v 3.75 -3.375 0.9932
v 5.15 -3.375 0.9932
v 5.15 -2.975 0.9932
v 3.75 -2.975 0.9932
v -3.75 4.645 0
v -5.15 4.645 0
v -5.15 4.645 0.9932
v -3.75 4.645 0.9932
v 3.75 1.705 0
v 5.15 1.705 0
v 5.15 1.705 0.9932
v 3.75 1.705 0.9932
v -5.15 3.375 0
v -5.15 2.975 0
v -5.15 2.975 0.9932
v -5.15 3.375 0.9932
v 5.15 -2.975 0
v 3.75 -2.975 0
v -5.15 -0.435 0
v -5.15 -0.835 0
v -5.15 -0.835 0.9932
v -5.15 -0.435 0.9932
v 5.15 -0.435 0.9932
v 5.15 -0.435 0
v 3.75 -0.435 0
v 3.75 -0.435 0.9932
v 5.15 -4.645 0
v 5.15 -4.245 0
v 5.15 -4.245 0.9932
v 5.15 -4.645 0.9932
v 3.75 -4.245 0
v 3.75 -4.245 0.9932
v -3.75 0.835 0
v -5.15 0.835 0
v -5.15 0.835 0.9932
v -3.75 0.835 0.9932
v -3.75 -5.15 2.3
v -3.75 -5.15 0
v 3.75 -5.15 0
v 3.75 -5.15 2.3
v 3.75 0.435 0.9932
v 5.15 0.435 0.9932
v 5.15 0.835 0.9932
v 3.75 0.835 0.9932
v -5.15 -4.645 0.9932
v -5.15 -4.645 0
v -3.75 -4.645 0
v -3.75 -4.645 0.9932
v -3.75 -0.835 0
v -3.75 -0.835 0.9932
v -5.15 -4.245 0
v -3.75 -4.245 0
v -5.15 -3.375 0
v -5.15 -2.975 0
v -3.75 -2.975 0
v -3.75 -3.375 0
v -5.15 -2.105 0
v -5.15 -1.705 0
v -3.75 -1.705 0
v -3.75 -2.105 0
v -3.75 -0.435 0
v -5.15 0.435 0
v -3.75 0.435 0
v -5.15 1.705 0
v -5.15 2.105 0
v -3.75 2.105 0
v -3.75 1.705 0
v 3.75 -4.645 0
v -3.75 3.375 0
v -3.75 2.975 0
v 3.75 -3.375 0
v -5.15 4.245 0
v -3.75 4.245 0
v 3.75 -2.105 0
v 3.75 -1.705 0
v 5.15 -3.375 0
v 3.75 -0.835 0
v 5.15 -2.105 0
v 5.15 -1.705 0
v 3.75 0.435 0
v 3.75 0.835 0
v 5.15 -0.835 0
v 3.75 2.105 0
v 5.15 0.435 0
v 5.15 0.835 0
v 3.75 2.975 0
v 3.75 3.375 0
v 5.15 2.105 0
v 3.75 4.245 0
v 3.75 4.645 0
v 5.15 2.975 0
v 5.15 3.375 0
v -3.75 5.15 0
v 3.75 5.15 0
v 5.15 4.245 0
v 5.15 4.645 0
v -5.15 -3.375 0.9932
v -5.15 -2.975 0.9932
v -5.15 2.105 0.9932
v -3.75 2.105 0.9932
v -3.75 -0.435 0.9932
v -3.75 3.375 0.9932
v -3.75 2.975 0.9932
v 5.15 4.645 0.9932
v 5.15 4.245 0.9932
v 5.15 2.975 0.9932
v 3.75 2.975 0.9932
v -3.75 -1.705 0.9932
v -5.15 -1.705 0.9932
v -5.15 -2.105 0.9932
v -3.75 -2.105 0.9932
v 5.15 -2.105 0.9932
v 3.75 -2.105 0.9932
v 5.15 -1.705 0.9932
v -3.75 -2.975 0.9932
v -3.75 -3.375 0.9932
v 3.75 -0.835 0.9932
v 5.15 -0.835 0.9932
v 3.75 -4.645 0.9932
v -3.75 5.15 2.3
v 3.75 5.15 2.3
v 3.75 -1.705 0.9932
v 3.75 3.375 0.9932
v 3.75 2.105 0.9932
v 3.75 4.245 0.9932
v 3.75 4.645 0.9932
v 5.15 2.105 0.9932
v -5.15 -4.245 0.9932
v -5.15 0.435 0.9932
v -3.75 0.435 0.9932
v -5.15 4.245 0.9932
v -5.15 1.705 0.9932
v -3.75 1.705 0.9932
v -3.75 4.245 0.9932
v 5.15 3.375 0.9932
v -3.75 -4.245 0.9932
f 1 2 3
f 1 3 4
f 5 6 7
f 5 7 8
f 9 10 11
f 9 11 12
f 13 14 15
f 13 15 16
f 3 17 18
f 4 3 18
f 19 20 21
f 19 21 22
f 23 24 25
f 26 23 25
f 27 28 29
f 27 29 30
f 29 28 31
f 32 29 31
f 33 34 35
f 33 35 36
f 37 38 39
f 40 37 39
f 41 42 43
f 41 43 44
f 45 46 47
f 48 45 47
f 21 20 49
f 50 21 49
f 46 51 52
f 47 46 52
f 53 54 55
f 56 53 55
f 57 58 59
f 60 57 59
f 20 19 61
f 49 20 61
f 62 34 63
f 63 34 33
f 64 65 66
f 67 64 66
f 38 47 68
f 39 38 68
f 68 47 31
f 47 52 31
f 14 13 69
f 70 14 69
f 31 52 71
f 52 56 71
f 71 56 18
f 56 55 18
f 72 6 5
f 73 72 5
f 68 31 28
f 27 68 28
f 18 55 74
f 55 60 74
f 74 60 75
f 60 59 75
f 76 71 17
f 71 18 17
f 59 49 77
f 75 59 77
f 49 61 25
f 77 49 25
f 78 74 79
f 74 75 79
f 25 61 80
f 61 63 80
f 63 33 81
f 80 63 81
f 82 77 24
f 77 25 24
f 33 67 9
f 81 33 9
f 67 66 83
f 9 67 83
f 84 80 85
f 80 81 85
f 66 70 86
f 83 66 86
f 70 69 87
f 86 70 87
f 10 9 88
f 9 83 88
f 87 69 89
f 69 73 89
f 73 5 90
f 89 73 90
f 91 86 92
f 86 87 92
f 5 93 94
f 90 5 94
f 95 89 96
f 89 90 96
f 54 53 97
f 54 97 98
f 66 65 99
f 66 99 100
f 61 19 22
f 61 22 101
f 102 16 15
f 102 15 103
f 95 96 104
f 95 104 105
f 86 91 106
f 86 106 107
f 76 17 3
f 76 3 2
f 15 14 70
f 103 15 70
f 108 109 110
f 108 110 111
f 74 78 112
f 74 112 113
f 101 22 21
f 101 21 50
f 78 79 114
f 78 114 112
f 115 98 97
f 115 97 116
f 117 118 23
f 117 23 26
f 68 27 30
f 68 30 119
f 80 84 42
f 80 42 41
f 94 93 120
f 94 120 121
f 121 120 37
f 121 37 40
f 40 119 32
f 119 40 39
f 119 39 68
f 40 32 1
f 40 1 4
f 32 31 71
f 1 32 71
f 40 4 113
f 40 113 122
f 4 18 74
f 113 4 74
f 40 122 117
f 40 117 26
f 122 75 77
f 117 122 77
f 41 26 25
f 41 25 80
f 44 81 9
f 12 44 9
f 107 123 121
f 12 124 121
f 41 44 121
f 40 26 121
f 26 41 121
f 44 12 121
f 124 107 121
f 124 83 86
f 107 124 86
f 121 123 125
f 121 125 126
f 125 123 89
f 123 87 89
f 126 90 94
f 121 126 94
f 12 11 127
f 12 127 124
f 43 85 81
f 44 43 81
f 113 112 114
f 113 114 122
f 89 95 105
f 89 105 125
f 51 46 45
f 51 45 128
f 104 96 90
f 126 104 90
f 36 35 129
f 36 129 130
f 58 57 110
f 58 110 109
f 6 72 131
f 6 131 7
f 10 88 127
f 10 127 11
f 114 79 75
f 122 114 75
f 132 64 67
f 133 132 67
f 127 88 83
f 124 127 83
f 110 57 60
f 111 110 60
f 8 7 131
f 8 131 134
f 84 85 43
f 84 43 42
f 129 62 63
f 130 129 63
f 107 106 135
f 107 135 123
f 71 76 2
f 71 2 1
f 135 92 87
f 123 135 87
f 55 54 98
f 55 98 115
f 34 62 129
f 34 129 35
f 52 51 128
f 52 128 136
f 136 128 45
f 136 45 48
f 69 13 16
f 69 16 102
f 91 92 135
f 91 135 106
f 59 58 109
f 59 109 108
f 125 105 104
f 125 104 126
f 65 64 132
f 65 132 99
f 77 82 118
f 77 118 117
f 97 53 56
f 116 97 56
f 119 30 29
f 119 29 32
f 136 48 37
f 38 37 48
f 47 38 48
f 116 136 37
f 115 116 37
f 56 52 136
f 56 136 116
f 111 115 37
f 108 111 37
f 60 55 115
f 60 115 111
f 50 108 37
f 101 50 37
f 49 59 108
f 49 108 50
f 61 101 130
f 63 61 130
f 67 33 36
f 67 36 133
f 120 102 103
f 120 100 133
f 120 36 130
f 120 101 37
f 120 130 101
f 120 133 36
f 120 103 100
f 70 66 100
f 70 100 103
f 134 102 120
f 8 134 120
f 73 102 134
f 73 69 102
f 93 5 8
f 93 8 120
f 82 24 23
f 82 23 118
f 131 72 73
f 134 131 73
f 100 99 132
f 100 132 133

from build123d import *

# Parameters (mm, degrees)
F0_W     = 7.5
F0_H     = 10.3
F1_DEPTH = 2.3
F2_W     = 1.4
F2_H     = 0.4
F3_DEPTH = 0.99318
F5_COUNT = 2
F5_ANGLE = 180


with BuildPart() as f1:
    # F0 (on Top) → F1 (new body)
    with BuildSketch(Plane.XY):
        Rectangle(F0_W, F0_H)
    extrude(amount=F1_DEPTH)

    # F2 (on Top) → F3 (join)
    with BuildSketch(Plane.XY):
        with Locations((-4.45, 4.445)):
            Rectangle(F2_W, F2_H)
        with Locations((-4.45, 3.175)):
            Rectangle(F2_W, F2_H)
        with Locations((-4.45, 1.905)):
            Rectangle(F2_W, F2_H)
        with Locations((-4.45, -1.905)):
            Rectangle(F2_W, F2_H)
        with Locations((-4.45, 0.635)):
            Rectangle(F2_W, F2_H)
        with Locations((-4.45, -0.635)):
            Rectangle(F2_W, F2_H)
        with Locations((-4.45, -3.175)):
            Rectangle(F2_W, F2_H)
        with Locations((-4.45, -4.445)):
            Rectangle(F2_W, F2_H)
    extrude(amount=F3_DEPTH)

    # F5: F1 ×2 about axis
    f5_axis = Axis((0, 0, 4.798143), (0, 0, 1))


with BuildPart() as f1_1:
    add(f1.part)
    for i in range(1, F5_COUNT):
        add(f1.part.rotate(f5_axis, i * F5_ANGLE / (F5_COUNT - 1)))


solid = f1_1.part
